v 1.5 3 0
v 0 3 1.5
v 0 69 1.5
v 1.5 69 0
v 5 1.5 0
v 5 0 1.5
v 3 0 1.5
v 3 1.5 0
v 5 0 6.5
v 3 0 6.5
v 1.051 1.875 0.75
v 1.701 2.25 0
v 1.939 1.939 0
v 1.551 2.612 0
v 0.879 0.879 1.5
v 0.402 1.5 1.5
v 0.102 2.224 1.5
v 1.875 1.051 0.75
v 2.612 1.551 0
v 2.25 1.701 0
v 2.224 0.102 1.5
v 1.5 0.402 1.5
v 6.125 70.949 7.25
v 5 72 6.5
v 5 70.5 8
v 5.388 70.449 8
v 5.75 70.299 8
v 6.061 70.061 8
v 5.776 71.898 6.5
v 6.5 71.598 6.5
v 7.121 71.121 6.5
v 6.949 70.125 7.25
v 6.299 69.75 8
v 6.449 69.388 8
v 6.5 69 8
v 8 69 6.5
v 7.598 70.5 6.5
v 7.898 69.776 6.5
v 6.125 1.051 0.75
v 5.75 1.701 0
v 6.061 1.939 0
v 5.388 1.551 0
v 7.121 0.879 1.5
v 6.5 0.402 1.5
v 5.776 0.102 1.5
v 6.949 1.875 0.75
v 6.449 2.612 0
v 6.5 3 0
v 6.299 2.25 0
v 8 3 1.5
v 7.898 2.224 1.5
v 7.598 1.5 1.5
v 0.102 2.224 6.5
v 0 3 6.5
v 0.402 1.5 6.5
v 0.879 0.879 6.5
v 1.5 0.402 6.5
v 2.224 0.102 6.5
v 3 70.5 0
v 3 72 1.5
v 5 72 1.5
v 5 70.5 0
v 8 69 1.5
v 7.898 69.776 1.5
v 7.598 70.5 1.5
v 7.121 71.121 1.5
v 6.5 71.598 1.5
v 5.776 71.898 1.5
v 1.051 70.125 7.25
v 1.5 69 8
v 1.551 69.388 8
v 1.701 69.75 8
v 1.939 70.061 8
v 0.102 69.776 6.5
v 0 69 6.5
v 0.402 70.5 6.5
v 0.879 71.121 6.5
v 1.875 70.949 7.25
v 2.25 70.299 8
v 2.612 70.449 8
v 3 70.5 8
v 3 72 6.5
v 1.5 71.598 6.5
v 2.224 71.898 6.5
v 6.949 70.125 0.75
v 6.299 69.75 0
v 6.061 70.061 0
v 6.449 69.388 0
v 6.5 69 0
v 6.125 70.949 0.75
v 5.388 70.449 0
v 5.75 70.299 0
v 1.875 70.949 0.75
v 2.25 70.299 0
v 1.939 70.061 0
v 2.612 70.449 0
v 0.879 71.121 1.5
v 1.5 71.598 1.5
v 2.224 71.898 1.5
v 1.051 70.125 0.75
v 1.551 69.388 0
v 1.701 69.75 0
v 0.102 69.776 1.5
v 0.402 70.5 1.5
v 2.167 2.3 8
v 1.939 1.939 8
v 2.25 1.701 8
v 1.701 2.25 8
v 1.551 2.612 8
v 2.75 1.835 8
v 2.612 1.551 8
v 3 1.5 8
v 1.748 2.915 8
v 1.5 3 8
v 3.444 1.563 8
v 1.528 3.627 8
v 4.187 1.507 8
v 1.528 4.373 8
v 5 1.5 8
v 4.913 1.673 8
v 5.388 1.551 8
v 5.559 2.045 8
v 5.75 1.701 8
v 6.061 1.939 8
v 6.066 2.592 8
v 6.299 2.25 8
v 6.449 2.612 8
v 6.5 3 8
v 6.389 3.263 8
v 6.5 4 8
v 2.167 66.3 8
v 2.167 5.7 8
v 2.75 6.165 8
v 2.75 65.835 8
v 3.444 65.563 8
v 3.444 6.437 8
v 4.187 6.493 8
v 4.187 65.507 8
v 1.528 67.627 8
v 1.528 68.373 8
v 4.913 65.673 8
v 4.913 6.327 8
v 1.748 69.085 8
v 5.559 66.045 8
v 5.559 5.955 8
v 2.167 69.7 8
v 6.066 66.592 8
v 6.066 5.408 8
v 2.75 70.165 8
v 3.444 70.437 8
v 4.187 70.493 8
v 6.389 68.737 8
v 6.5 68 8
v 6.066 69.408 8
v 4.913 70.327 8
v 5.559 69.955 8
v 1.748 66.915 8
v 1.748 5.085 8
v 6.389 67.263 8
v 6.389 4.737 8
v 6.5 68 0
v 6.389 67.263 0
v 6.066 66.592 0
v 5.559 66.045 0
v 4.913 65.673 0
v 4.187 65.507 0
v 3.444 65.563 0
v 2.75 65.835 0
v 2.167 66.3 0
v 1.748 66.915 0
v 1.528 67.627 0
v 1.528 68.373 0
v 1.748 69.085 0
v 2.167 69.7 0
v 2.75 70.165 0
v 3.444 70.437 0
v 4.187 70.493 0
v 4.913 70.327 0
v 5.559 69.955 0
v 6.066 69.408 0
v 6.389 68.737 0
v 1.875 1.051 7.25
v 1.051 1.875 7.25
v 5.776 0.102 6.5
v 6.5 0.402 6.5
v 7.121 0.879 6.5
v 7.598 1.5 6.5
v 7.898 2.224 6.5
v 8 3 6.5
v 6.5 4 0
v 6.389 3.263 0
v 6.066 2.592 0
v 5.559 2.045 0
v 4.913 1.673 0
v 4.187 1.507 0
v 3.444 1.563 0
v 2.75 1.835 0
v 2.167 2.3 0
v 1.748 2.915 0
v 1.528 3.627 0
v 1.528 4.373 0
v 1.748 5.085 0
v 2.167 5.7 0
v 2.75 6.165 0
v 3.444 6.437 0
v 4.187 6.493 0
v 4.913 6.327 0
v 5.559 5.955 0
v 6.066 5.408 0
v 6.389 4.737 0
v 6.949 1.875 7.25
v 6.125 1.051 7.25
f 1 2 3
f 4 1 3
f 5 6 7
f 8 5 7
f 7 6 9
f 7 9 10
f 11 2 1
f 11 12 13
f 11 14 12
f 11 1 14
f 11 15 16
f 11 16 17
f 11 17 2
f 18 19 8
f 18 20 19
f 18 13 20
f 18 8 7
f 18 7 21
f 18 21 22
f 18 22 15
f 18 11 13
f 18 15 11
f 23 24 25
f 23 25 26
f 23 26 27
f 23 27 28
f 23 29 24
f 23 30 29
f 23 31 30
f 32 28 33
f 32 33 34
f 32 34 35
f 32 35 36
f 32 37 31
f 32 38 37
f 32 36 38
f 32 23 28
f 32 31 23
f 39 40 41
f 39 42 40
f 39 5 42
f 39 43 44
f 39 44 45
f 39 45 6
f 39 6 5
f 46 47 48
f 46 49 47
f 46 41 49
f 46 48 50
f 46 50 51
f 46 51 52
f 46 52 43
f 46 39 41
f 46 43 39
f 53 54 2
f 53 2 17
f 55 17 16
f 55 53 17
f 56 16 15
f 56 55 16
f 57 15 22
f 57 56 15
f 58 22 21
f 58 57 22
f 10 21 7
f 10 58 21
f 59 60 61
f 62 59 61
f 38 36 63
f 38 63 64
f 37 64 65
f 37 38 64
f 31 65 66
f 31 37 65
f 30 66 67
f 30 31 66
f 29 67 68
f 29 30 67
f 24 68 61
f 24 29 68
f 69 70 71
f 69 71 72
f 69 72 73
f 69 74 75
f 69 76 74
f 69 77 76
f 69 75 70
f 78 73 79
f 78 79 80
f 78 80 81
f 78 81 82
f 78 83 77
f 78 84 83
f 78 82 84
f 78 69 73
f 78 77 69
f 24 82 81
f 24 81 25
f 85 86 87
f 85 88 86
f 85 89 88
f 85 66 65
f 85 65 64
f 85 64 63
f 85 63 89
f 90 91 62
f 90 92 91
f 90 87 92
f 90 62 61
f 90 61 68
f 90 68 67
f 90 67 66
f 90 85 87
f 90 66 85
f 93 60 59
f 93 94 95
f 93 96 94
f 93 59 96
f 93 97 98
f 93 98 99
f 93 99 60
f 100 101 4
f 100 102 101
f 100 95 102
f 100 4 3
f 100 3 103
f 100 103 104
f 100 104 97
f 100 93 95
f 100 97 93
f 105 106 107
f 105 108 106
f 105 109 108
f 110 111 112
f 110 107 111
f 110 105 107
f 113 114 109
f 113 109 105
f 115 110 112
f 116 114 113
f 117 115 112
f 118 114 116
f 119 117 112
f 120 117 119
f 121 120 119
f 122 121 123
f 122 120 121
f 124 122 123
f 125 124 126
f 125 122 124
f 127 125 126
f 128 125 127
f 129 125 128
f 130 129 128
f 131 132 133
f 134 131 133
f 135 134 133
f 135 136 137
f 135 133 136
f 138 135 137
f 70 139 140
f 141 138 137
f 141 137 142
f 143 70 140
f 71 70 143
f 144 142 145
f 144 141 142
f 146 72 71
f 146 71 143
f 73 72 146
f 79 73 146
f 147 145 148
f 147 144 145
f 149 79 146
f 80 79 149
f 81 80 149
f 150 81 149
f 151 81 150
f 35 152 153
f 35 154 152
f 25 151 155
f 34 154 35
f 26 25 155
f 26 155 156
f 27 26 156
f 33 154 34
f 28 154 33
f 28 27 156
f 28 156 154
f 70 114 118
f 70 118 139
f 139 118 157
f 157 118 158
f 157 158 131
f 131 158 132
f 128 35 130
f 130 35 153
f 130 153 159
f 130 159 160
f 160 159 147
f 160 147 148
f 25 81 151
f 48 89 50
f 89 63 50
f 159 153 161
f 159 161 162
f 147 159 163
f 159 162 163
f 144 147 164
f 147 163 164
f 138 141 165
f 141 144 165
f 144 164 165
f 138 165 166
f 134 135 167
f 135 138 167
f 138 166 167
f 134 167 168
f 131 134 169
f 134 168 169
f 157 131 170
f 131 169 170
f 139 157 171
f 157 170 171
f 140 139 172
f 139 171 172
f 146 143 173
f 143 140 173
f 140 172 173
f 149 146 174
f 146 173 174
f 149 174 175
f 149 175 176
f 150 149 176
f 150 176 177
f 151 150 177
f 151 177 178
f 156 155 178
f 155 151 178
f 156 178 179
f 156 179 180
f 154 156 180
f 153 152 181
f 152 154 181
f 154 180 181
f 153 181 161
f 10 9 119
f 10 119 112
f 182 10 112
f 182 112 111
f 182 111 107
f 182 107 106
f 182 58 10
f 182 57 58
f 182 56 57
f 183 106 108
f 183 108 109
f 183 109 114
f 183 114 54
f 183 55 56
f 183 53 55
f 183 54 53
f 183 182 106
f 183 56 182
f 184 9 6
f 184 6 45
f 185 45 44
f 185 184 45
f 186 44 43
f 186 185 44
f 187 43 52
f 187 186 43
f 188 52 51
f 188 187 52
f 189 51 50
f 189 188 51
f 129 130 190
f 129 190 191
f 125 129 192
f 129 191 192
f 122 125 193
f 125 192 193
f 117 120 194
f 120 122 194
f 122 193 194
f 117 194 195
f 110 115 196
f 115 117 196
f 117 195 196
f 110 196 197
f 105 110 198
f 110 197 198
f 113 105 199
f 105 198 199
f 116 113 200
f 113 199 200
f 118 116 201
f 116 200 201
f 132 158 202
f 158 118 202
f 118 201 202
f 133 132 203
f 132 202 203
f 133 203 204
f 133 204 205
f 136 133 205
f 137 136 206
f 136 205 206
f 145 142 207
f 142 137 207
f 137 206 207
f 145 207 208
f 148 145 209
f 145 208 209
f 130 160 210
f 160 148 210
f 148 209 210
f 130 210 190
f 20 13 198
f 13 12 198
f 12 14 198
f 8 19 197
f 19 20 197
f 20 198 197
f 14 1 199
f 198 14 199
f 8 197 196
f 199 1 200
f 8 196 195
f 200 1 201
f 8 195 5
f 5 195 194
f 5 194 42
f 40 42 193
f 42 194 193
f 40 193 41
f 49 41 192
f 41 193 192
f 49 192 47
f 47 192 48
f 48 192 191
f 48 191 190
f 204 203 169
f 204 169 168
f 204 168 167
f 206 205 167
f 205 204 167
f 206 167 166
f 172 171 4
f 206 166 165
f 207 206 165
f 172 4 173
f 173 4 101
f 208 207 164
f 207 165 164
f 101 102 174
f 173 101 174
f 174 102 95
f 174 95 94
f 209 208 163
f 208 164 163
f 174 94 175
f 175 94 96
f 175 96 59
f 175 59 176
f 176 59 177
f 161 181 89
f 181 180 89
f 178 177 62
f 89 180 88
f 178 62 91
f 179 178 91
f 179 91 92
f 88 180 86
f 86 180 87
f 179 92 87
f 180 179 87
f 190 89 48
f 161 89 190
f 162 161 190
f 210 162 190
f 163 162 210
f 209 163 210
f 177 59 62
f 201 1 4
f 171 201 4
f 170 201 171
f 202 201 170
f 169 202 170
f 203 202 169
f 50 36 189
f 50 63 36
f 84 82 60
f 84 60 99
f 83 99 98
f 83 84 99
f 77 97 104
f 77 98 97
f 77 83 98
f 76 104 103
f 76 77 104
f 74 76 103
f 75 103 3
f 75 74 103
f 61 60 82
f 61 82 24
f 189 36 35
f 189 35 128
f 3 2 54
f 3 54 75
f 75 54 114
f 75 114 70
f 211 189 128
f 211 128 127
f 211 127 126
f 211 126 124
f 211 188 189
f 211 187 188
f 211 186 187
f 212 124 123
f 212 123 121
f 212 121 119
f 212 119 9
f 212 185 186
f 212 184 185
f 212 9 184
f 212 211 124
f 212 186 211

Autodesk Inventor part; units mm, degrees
ref_plane "YZ Plane" through (0, 0, 0) normal (1, 0, 0) x (0, 1, 0)
ref_plane "XZ Plane" through (0, 0, 0) normal (0, 1, 0) x (-1, 0, 0)
ref_plane "XY Plane" through (0, 0, 0) normal (0, 0, 1) x (1, 0, 0)
sketch "Sketch1" plane through (0, 0, 0) normal (0, 0, 1) x (1, 0, 0)
  line L0 (0, 72) -> (8, 72)
  line L1 (8, 72) -> (8, 0)
  line L2 (8, 0) -> (0, 0)
  line L3 (0, 0) -> (0, 72)
  circle A0 centre (4, 68) radius 2.5
  circle A1 centre (4, 4) radius 2.5
  dimension "d0" = 8
  dimension "d1" = 72
  dimension "d2" = 5
  dimension "d3" = 5
  dimension "d4" = 4
  dimension "d5" = 64
  dimension "d7" = 4
  dimension "d8" = 4
extrude "Extrusion1" add sketch "Sketch1" along normal blind 8
fillet "Fillet1" radius 3 4 edges at (8, 72, 4) (0, 72, 4) (8, 0, 4) (0, 0, 4)
chamfer "Chamfer1" distance 1.5 angle 45 16 edges at (0, 36, 8) (0.8787, 0.8787, 8) (4, 0, 8) (7.1213, 0.8787, 8) (8, 36, 8) (7.1213, 71.1213, 8) (4, 72, 8) (0.8787, 71.1213, 8) (8, 36, 0) (7.1213, 71.1213, 0) (4, 72, 0) (0.8787, 71.1213, 0) (0, 36, 0) (0.8787, 0.8787, 0) (4, 0, 0) (7.1213, 0.8787, 0)
equation "\"d3\" = d2"
properties part number "base"
